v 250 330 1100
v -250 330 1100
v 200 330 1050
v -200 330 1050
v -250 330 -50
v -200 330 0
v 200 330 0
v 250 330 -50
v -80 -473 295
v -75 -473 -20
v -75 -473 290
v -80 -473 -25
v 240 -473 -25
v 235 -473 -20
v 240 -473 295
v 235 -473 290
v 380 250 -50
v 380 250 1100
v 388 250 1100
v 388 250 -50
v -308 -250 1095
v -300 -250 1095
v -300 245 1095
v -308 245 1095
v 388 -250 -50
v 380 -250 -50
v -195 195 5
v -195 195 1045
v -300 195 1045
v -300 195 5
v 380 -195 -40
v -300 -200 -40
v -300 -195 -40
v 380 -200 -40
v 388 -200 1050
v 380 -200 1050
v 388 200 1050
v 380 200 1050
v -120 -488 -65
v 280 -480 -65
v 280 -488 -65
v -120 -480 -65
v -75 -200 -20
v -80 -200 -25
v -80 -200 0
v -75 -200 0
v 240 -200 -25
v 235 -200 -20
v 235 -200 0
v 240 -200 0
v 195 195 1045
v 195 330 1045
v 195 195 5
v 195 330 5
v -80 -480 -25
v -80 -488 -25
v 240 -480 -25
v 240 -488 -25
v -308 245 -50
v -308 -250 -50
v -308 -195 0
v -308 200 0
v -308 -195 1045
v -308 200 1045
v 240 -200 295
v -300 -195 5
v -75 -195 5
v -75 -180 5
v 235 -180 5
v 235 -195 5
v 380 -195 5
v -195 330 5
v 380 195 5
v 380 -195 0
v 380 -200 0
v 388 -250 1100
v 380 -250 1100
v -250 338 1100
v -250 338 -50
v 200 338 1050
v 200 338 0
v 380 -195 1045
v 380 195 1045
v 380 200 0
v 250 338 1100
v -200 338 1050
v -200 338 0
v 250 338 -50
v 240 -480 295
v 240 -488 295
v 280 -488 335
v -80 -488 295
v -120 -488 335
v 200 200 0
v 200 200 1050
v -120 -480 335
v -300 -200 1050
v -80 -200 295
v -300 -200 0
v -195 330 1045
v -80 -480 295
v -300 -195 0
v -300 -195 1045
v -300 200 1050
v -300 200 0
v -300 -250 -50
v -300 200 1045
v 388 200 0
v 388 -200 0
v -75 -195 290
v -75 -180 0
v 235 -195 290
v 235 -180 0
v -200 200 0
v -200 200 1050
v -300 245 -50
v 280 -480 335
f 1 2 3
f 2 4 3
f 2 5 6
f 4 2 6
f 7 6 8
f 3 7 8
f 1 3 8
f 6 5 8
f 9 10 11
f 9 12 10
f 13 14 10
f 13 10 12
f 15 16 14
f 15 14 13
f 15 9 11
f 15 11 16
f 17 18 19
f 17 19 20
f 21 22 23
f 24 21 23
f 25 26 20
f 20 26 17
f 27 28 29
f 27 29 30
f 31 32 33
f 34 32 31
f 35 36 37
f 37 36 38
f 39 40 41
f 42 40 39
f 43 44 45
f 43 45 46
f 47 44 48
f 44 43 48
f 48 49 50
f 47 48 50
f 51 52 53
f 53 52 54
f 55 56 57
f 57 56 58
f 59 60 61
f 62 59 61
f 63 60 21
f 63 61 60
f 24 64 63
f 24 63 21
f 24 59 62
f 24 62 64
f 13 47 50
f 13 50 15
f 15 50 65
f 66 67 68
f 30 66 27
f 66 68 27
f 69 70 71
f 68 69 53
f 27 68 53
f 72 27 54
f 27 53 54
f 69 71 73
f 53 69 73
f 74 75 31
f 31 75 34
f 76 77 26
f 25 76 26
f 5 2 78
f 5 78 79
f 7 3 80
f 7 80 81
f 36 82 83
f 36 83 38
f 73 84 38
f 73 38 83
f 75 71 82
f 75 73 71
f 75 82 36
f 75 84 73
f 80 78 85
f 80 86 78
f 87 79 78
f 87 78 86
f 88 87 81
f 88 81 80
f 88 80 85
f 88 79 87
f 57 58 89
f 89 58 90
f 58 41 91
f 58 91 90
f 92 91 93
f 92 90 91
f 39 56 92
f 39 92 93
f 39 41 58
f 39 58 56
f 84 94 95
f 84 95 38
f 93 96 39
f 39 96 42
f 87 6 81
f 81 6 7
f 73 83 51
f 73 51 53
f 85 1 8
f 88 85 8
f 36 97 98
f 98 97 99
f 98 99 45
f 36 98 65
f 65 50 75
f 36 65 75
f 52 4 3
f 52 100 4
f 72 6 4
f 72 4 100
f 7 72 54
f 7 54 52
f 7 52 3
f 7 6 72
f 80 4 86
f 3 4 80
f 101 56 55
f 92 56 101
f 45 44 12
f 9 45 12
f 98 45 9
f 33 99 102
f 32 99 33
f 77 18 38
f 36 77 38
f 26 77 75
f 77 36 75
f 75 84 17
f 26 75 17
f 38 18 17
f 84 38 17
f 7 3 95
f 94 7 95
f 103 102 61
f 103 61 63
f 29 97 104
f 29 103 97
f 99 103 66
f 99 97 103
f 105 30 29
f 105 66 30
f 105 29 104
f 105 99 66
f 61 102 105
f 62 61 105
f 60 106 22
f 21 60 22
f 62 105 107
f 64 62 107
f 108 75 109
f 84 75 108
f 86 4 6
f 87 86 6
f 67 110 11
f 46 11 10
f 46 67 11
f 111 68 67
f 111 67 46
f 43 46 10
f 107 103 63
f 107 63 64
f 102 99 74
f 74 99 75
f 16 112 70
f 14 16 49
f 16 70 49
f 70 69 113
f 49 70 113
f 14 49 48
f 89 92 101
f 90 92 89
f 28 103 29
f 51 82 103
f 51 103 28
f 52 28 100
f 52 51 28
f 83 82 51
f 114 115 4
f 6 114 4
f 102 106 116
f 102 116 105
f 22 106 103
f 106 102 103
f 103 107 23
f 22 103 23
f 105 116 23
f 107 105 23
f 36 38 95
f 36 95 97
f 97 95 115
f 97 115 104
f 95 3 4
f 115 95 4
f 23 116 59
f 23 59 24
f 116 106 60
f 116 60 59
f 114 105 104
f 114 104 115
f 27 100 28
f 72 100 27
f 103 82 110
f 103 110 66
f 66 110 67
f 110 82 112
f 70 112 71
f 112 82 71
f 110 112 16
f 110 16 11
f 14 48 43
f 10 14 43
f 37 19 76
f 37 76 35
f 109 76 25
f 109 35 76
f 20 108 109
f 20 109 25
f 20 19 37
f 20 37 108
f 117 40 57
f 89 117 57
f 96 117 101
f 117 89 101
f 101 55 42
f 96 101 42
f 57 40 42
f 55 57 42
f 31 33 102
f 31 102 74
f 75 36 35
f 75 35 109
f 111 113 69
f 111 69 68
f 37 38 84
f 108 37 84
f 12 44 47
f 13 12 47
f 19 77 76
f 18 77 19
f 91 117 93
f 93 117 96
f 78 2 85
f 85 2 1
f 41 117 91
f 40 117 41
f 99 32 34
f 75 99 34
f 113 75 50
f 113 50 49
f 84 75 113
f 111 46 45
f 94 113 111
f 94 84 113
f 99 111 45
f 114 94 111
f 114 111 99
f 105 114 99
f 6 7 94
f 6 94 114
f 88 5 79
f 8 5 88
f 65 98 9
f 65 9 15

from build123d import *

# Parameters (mm, degrees)
BOSS_EXTRUDE1_DEPTH     = 1050
SKETCH4_W               = 320
SKETCH4_H               = 320
BOSS_EXTRUDE2_DEPTH     = 280
SKETCH5_W               = 1150
SKETCH5_H               = 500
SKETCH5_W_2             = 1050
SKETCH5_H_2             = 400
BOSS_EXTRUDE3_DEPTH     = 8
SKETCH6_W               = 1040
SKETCH6_H               = 390
CUT_EXTRUDE1_DEPTH      = 690
SKETCH7_W               = 500
SKETCH7_H               = 1150
SKETCH7_W_2             = 400
SKETCH7_H_2             = 1050
BOSS_EXTRUDE4_DEPTH     = 8
SKETCH11_W              = 1145
SKETCH11_H              = 495
SKETCH11_W_2            = 1045
SKETCH11_H_2            = 395
BOSS_EXTRUDE8_DEPTH     = 8
SKETCH12_W              = 390
SKETCH12_H              = 1040
CUT_EXTRUDE4_DEPTH      = 300
CUT_EXTRUDE5_DEPTH      = 1425.664170954
CUT_EXTRUDE5_DEPTH_BACK = 300
SKETCH14_W              = 310
SKETCH14_H              = 310
SKETCH15_W              = 400
SKETCH15_H              = 400
BOSS_EXTRUDE9_DEPTH     = 8
SKETCH17_W              = 680
SKETCH17_H              = 40
BOSS_EXTRUDE13_DEPTH    = 5
SKETCH18_W              = 320
SKETCH18_H              = 320
CUT_EXTRUDE6_DEPTH      = 15


with BuildPart() as part:
    # Sketch2 → Boss-Extrude1 (new body)
    with BuildSketch(Plane.XY):
        Polygon((200, 200), (380, 200), (380, -200), (200, -200), (-200, -200), (-300, -200), (-300, 200), (-200, 200), (-200, 330), (200, 330), align=None)
    extrude(amount=BOSS_EXTRUDE1_DEPTH)

    # Sketch4 → Boss-Extrude2 (add)
    with BuildSketch(Plane.XZ.offset(200)):
        with Locations((80, 135)):
            Rectangle(SKETCH4_W, SKETCH4_H)
    extrude(amount=BOSS_EXTRUDE2_DEPTH)

    # Sketch6 → Cut-Extrude1 (cut)
    with BuildSketch(Plane(origin=(380, 0, 0), x_dir=(0, 0, -1), z_dir=(1, 0, 0))):
        with Locations((-525, 0)):
            Rectangle(SKETCH6_W, SKETCH6_H)
    extrude(amount=-CUT_EXTRUDE1_DEPTH, mode=Mode.SUBTRACT)

    # Sketch12 → Cut-Extrude4 (cut)
    with BuildSketch(Plane(origin=(0, 330, 0), x_dir=(1, 0, 0), z_dir=(0, 1, 0))):
        with Locations((0, -525)):
            Rectangle(SKETCH12_W, SKETCH12_H)
    extrude(amount=-CUT_EXTRUDE4_DEPTH, mode=Mode.SUBTRACT)

    # Sketch14 → Cut-Extrude5 (cut, two sides: drawn at the far end of the back side and taken through both)
    with BuildSketch(Plane(origin=(0, -480, 0), x_dir=(-1, 0, 0), z_dir=(0, -1, 0)).offset(-CUT_EXTRUDE5_DEPTH_BACK)):
        with Locations((-80, -135)):
            Rectangle(SKETCH14_W, SKETCH14_H)
    extrude(amount=CUT_EXTRUDE5_DEPTH + CUT_EXTRUDE5_DEPTH_BACK, mode=Mode.SUBTRACT)

    # Sketch15 → Boss-Extrude9 (add)
    with BuildSketch(Plane(origin=(0, -480, 0), x_dir=(-1, 0, 0), z_dir=(0, -1, 0))):
        with Locations((-80, -135)):
            Rectangle(SKETCH15_W, SKETCH15_H)
    extrude(amount=BOSS_EXTRUDE9_DEPTH)

    # Sketch18 → Cut-Extrude6 (cut)
    with BuildSketch(Plane.XZ.offset(488)):
        with Locations((80, 135)):
            Rectangle(SKETCH18_W, SKETCH18_H)
    extrude(amount=-CUT_EXTRUDE6_DEPTH, mode=Mode.SUBTRACT)


with BuildPart() as body_2:
    # Sketch5 → Boss-Extrude3 (new body)
    with BuildSketch(Plane(origin=(380, 0, 0), x_dir=(0, 0, -1), z_dir=(1, 0, 0))):
        with Locations((-525, 0)):
            Rectangle(SKETCH5_W, SKETCH5_H)
        with Locations((-525, 0)):
            Rectangle(SKETCH5_W_2, SKETCH5_H_2, mode=Mode.SUBTRACT)
    extrude(amount=BOSS_EXTRUDE3_DEPTH)


with BuildPart() as body_3:
    # Sketch7 → Boss-Extrude4 (new body)
    with BuildSketch(Plane(origin=(0, 330, 0), x_dir=(1, 0, 0), z_dir=(0, 1, 0))):
        with Locations((0, -525)):
            Rectangle(SKETCH7_W, SKETCH7_H)
        with Locations((0, -525)):
            Rectangle(SKETCH7_W_2, SKETCH7_H_2, mode=Mode.SUBTRACT)
    extrude(amount=BOSS_EXTRUDE4_DEPTH)


with BuildPart() as body_4:
    # Sketch11 → Boss-Extrude8 (new body)
    with BuildSketch(Plane.ZY.offset(300)):
        with Locations((522.5, -2.5)):
            Rectangle(SKETCH11_W, SKETCH11_H)
        with Locations((522.5, 2.5)):
            Rectangle(SKETCH11_W_2, SKETCH11_H_2, mode=Mode.SUBTRACT)
    extrude(amount=BOSS_EXTRUDE8_DEPTH)


with BuildPart() as body_5:
    # Sketch17 → Boss-Extrude13 (new body)
    with BuildSketch(Plane(origin=(0, -200, 0), x_dir=(1, 0, 0), z_dir=(0, 1, 0))):
        with Locations((40, 20)):
            Rectangle(SKETCH17_W, SKETCH17_H)
    extrude(amount=BOSS_EXTRUDE13_DEPTH)


with BuildPart() as cut_extrude6_piece_1:
    # of the separate pieces the step leaves, piece 1, a body of its own (cut_extrude6_pieces)
    add(part.part.solids().sort_by_distance((-80, -200, -25))[0])


with BuildPart() as cut_extrude6_piece_2:
    # of the separate pieces the step leaves, piece 2, a body of its own (cut_extrude6_pieces)
    add(part.part.solids().sort_by_distance((-120, -480, 335))[0])


solid = Compound([body_2.part, body_3.part, body_4.part, body_5.part, cut_extrude6_piece_1.part, cut_extrude6_piece_2.part])
